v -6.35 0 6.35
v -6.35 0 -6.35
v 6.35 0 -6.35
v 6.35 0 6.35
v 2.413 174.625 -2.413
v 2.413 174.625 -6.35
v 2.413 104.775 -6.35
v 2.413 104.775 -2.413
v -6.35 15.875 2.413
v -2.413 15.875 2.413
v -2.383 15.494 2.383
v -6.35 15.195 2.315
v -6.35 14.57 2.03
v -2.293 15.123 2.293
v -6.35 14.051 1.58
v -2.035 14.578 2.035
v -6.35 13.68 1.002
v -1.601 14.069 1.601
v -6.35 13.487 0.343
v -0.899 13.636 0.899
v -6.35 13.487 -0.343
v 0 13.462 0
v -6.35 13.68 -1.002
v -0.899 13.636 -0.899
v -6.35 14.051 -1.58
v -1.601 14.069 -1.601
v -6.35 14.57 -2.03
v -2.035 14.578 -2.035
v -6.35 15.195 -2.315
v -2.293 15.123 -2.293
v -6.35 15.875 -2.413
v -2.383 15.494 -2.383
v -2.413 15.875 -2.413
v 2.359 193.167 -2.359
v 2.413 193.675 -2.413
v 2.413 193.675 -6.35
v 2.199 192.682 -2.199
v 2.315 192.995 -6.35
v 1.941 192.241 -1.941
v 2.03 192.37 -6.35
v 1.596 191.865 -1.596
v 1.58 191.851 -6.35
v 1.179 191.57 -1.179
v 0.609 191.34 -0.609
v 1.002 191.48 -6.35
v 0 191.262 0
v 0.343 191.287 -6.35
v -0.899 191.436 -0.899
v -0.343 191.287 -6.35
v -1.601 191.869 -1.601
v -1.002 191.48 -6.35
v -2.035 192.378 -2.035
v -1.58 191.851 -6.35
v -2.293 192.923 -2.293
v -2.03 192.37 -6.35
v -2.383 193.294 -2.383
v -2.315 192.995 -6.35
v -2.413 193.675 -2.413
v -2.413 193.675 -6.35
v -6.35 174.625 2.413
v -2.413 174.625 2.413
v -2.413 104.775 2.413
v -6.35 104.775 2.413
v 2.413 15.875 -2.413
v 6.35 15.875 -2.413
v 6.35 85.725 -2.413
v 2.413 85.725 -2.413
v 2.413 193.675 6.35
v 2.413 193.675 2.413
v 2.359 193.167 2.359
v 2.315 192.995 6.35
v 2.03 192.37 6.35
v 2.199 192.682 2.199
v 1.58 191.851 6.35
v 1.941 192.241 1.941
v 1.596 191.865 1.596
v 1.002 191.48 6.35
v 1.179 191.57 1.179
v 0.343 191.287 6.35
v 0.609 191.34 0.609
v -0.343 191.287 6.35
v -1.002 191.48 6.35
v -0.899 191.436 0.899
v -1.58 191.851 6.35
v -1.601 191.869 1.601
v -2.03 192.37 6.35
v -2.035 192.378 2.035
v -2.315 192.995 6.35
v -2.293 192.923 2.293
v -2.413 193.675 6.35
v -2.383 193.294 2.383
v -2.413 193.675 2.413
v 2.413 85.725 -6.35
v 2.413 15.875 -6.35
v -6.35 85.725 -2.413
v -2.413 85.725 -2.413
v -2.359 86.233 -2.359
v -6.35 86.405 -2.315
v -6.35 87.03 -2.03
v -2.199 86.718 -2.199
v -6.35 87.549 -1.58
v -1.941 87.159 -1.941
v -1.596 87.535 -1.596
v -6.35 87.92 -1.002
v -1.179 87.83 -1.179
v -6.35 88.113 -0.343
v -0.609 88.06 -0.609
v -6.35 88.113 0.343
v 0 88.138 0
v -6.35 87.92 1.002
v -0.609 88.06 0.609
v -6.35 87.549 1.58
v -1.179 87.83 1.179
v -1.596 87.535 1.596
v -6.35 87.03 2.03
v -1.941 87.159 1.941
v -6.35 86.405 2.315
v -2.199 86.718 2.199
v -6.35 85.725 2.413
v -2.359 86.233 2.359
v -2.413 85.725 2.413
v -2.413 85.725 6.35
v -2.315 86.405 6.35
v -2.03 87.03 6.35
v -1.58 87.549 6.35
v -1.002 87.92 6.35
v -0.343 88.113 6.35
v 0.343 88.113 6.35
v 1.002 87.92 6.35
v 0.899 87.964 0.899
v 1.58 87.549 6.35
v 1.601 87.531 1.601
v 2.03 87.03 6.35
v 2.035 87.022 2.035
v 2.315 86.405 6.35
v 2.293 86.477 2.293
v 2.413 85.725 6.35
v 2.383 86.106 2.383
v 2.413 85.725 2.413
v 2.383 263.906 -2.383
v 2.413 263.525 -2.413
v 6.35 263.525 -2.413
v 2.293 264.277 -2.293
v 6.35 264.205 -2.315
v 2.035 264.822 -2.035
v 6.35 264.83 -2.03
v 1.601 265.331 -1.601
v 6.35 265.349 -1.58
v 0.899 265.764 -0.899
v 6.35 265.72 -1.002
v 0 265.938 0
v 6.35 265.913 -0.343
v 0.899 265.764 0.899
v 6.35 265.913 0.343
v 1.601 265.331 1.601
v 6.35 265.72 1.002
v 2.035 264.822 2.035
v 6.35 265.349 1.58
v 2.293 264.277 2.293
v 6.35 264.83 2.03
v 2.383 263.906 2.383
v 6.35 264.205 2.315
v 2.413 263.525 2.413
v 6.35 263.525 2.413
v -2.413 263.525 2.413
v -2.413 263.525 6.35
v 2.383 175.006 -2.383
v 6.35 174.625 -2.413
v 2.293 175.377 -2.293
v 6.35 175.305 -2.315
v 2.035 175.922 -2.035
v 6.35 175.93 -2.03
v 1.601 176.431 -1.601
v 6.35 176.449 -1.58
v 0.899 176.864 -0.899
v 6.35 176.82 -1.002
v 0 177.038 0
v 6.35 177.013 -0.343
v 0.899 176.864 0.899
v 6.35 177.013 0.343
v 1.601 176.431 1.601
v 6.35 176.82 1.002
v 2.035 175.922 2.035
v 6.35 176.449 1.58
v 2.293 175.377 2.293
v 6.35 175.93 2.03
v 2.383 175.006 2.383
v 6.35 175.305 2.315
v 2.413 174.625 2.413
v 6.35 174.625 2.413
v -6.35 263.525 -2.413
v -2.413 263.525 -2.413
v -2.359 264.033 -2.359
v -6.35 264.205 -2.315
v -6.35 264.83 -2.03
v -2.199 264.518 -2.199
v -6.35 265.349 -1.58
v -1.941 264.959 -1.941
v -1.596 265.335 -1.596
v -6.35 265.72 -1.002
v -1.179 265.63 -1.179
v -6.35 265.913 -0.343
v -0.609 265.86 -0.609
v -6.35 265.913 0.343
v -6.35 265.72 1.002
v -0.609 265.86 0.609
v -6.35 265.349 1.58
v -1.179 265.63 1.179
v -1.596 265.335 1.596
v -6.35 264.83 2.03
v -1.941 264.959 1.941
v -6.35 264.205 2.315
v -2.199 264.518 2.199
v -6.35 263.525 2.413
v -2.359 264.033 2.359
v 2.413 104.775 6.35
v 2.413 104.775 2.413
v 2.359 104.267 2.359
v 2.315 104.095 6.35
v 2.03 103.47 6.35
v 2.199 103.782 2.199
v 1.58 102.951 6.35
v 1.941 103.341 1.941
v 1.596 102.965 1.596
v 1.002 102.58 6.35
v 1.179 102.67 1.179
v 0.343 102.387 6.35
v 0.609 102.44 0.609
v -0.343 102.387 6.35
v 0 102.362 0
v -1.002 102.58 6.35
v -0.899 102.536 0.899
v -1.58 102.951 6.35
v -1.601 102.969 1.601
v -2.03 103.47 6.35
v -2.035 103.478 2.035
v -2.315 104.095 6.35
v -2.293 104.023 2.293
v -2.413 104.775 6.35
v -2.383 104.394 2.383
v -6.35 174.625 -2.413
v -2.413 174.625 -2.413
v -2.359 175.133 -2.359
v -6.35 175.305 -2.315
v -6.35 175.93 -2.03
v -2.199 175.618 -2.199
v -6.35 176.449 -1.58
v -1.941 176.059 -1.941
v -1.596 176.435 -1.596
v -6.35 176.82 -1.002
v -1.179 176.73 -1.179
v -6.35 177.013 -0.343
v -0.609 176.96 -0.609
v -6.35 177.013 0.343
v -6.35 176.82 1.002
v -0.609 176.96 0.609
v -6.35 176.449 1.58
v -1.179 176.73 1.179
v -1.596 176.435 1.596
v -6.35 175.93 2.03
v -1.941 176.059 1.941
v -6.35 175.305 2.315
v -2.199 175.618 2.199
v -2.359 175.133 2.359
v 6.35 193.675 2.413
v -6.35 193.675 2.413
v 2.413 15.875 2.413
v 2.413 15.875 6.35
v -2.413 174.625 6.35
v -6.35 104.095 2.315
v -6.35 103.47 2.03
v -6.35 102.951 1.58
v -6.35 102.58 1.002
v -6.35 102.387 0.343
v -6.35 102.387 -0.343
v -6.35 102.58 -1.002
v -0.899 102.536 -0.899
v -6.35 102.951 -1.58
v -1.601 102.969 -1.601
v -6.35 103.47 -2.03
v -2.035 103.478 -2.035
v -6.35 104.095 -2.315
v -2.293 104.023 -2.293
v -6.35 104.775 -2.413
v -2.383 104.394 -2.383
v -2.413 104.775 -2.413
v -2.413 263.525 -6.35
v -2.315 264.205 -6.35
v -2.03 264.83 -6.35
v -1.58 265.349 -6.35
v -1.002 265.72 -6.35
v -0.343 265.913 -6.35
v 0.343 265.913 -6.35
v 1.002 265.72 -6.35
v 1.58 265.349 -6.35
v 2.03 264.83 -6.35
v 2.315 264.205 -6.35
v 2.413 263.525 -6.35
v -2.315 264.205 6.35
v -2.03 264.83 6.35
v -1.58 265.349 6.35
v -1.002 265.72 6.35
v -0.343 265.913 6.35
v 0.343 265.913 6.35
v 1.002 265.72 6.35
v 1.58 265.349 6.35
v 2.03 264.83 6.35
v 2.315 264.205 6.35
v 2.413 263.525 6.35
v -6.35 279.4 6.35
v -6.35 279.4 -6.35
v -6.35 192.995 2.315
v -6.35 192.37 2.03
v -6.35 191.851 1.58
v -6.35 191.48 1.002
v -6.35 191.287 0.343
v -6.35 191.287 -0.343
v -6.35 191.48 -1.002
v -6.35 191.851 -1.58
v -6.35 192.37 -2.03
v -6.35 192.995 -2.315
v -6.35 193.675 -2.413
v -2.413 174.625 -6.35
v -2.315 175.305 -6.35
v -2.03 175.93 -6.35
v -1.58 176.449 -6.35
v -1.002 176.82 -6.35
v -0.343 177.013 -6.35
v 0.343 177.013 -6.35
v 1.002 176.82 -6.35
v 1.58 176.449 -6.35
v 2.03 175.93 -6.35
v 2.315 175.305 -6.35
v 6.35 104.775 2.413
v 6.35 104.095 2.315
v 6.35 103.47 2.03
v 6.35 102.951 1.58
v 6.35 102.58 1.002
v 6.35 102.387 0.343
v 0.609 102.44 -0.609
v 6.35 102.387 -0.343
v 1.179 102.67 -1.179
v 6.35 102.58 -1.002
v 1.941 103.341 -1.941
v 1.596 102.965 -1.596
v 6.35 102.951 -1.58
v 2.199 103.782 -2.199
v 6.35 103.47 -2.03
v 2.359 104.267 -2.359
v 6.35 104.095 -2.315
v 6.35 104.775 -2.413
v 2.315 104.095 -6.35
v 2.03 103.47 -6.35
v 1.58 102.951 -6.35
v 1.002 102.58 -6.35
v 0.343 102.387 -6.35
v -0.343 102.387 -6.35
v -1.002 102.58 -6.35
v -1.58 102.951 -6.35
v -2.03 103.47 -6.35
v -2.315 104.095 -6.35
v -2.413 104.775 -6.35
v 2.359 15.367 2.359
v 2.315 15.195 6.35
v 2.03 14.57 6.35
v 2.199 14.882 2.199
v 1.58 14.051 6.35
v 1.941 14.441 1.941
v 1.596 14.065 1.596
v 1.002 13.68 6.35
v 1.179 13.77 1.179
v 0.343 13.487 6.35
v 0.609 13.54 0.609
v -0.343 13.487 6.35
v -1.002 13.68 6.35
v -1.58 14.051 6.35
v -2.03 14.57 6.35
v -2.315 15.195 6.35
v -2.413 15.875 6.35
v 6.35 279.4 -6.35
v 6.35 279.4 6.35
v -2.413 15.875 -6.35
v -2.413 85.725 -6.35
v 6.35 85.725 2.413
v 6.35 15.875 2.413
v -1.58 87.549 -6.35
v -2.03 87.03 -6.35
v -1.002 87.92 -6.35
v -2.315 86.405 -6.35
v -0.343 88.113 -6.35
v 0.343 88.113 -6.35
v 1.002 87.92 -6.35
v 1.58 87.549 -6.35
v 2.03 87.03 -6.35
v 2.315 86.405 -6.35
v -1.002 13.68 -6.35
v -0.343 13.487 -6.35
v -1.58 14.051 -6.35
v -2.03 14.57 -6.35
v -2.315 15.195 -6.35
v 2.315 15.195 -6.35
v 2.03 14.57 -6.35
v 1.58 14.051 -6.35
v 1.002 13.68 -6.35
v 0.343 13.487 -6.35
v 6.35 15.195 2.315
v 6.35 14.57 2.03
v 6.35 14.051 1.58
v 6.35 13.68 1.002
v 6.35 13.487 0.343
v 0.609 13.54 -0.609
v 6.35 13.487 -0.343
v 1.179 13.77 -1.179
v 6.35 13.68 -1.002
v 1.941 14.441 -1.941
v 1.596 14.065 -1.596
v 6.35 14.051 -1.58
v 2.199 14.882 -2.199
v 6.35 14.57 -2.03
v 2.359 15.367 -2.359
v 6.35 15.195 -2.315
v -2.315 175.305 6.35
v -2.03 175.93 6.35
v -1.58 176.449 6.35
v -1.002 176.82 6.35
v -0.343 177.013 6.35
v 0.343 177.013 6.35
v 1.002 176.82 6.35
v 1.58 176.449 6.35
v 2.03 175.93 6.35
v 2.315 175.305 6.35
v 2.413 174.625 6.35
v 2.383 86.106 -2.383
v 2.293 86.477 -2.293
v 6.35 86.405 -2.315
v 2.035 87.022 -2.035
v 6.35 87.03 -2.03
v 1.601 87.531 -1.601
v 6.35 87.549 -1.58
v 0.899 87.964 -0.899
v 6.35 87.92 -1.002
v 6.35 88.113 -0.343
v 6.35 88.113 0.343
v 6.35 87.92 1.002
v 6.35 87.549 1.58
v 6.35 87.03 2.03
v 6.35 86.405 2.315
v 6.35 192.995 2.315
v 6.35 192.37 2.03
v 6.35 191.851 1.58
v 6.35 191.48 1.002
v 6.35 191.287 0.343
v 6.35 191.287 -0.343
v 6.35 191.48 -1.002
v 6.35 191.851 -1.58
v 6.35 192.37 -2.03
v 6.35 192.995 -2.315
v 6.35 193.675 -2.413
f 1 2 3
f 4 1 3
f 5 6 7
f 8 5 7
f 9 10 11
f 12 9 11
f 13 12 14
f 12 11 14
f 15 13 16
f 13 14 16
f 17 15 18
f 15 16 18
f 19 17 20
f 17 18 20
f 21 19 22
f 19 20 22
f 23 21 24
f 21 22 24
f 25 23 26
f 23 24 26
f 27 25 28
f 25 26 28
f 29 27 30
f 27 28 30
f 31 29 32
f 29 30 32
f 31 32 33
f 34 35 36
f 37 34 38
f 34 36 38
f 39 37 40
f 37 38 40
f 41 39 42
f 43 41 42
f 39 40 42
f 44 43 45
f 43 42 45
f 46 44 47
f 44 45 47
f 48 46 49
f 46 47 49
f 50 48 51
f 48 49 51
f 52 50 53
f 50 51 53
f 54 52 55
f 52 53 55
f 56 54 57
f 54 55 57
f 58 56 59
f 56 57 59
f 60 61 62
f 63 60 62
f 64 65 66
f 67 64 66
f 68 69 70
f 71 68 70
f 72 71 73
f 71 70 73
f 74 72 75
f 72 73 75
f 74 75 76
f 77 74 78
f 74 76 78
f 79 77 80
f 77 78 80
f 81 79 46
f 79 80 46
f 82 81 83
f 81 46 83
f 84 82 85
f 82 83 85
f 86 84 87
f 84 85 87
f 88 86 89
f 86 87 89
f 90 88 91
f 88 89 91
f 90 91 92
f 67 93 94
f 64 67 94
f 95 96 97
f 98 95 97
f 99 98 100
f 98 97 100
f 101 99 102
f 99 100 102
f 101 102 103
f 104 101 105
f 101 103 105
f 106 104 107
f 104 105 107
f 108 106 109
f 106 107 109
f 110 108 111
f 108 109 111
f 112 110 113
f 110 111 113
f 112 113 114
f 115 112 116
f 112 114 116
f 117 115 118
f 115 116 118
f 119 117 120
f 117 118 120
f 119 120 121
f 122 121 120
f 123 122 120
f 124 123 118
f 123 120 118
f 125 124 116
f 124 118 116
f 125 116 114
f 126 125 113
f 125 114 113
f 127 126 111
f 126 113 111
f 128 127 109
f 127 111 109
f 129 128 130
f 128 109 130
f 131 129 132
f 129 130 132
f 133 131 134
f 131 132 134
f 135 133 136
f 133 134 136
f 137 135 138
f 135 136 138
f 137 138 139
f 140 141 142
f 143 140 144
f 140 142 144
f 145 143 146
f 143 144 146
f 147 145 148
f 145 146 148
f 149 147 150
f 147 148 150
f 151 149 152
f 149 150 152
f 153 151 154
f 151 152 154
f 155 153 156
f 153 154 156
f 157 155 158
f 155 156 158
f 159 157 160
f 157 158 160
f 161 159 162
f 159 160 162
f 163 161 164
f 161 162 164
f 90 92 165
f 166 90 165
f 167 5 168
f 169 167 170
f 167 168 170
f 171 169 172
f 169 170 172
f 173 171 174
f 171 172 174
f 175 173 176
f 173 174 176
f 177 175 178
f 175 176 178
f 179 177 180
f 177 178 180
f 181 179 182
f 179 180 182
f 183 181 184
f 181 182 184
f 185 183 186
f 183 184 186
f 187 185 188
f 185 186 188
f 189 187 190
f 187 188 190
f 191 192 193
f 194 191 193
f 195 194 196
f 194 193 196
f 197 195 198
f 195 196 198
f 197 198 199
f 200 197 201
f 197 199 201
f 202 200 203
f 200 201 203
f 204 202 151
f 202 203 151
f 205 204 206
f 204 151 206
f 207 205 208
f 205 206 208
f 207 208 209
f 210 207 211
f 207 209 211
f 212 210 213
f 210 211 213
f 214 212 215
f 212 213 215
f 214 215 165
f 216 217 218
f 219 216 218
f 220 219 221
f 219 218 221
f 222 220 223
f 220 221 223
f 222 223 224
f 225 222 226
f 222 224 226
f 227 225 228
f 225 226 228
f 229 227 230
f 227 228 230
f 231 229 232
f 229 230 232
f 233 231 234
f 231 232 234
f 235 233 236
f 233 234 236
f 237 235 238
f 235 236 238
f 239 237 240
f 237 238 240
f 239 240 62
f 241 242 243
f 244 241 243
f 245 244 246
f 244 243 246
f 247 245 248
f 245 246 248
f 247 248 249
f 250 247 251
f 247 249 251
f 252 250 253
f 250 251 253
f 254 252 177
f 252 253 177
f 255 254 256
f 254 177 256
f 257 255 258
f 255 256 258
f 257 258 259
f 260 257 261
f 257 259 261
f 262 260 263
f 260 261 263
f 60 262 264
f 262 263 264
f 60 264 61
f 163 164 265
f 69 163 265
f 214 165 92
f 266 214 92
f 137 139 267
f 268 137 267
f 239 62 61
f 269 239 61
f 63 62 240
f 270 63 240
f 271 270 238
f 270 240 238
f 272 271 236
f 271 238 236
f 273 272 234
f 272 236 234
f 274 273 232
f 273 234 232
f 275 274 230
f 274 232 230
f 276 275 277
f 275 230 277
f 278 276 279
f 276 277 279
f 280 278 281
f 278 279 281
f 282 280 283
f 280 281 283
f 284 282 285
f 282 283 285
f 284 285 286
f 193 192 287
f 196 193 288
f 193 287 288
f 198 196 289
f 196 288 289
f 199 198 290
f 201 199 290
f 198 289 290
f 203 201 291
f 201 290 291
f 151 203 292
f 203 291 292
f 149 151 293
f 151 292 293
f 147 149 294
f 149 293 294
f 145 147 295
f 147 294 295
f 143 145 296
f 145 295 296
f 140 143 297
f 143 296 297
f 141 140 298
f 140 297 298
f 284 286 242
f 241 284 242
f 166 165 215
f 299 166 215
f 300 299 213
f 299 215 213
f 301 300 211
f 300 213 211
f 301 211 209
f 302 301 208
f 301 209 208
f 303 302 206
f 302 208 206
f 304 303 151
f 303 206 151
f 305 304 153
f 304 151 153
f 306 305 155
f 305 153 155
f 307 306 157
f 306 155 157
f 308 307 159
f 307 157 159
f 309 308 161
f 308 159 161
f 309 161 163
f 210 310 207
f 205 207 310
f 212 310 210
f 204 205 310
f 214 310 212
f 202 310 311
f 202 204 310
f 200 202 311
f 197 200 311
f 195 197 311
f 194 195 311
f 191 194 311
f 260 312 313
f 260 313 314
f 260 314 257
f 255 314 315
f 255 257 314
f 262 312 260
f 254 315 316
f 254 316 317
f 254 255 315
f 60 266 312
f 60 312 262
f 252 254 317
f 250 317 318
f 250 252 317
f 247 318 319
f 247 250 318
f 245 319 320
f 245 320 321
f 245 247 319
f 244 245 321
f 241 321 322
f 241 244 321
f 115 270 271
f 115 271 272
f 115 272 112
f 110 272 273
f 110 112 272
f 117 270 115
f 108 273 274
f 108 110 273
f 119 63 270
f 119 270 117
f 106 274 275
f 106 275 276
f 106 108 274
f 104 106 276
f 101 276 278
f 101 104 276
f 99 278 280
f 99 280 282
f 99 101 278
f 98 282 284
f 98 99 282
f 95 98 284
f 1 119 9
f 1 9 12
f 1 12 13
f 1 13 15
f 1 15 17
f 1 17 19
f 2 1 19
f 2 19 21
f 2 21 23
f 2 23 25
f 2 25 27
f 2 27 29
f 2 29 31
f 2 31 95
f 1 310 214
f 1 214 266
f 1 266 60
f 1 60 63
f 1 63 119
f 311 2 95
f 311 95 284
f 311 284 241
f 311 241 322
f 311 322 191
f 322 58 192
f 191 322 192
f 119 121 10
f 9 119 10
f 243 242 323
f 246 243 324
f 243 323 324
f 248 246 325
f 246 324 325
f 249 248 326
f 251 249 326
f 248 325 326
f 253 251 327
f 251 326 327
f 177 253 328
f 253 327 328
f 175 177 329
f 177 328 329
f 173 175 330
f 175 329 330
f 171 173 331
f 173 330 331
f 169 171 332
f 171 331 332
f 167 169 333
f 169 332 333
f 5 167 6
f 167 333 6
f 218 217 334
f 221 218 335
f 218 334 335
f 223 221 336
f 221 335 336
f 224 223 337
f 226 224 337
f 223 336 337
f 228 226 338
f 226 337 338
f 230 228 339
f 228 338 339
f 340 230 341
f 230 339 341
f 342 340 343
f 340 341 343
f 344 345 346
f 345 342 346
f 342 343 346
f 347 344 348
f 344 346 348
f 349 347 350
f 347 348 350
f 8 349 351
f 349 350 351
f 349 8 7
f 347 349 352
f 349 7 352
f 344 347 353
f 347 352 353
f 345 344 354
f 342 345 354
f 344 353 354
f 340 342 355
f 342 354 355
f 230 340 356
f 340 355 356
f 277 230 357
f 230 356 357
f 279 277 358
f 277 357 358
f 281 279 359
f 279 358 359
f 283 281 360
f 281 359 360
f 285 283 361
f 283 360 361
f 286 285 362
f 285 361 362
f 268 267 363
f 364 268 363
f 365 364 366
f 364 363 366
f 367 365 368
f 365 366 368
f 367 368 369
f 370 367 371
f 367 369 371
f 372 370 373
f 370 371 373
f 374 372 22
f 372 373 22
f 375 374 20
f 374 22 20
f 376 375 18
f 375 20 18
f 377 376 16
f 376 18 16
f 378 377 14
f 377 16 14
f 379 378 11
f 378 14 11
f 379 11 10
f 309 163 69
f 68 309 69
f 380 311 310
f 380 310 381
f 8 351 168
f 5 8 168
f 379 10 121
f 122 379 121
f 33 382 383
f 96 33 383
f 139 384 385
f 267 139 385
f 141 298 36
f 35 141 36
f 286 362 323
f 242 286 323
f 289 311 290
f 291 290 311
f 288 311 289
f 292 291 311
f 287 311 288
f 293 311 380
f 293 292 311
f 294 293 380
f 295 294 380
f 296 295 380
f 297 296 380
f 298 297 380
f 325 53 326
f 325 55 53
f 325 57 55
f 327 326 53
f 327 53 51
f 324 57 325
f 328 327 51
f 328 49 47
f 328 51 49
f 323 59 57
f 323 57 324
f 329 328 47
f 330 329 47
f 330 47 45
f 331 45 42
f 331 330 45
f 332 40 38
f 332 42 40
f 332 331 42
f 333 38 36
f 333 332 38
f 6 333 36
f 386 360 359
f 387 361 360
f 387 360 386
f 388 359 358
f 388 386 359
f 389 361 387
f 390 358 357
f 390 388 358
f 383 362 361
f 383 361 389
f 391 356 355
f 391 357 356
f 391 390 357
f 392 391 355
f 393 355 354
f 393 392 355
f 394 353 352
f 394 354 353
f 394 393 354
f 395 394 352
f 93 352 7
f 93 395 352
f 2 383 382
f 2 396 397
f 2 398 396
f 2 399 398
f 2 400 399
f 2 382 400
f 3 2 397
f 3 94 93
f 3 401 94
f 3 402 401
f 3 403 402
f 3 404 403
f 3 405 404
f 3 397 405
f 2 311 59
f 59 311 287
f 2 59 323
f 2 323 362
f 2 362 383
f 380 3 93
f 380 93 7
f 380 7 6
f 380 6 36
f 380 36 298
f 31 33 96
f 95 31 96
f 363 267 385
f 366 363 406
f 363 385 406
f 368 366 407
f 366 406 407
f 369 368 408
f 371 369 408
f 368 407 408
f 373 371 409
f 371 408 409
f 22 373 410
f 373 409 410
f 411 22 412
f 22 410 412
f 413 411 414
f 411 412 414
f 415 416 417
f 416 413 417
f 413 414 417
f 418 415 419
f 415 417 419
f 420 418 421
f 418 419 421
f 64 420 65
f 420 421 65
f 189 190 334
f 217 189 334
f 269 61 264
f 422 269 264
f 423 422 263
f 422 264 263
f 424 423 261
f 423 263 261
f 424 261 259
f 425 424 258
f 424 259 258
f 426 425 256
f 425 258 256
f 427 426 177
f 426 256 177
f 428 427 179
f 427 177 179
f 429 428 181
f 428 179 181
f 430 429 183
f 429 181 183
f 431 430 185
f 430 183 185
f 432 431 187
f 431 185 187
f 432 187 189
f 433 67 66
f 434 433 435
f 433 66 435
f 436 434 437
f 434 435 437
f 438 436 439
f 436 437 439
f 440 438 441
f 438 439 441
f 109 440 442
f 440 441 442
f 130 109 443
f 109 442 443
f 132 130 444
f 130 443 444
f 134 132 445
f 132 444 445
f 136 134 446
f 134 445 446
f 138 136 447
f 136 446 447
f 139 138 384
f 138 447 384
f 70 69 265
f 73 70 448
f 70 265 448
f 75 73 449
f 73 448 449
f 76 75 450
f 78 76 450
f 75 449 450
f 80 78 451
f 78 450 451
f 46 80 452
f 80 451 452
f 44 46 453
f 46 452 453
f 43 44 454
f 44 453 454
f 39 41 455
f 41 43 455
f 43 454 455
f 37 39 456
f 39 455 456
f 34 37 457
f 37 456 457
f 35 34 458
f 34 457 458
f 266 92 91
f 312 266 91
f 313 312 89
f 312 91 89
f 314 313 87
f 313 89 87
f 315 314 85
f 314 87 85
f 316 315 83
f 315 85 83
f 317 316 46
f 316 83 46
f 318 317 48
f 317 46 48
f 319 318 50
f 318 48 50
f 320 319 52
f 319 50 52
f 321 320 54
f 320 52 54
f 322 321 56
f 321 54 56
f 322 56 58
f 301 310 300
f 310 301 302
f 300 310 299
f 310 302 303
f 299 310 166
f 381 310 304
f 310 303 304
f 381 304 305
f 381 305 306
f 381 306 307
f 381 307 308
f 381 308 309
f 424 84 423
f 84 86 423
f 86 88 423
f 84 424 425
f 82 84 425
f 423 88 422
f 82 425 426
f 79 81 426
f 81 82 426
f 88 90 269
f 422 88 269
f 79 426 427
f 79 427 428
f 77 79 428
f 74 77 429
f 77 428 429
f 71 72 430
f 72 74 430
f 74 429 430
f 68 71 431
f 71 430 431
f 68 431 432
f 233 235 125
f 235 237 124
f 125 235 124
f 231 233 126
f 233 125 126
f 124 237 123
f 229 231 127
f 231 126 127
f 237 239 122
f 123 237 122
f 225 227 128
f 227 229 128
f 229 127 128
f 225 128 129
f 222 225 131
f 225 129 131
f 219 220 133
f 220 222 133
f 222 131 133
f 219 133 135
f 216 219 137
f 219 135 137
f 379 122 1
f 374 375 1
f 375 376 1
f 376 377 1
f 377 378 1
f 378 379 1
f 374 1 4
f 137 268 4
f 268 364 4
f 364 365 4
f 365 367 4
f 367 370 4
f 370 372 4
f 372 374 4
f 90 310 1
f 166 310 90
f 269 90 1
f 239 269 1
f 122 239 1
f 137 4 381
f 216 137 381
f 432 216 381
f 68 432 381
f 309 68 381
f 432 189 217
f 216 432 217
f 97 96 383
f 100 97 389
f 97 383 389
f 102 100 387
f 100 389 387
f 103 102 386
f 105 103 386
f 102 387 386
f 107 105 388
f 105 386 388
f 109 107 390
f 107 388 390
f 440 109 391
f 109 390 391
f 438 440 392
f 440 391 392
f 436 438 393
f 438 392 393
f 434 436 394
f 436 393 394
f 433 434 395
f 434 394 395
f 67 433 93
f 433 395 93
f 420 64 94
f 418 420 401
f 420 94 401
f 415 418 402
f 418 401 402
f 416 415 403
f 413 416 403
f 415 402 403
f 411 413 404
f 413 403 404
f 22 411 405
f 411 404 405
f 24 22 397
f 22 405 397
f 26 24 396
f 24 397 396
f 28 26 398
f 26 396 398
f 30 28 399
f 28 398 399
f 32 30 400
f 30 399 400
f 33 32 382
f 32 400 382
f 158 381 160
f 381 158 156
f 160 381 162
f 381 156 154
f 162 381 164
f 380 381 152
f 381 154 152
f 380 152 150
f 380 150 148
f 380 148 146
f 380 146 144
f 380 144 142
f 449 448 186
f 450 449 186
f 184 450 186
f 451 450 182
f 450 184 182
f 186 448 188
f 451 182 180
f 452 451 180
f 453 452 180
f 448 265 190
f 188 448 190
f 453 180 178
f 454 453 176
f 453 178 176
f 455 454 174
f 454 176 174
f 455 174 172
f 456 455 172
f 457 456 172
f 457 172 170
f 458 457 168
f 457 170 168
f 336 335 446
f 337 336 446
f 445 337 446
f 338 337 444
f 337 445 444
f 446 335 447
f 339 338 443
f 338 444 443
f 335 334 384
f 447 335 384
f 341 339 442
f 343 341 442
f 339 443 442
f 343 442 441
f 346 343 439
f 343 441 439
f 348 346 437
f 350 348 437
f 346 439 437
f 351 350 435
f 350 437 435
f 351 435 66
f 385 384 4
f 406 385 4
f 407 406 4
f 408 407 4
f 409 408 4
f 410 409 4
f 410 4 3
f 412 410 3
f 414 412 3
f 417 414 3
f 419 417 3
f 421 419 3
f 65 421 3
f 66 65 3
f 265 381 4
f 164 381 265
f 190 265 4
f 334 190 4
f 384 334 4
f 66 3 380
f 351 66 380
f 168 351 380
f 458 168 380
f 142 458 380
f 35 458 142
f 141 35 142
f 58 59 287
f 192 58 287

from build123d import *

# Parameters (mm, degrees)
SKETCH1_W           = 12.7
SKETCH1_H           = 12.7
BOSS_EXTRUDE1_DEPTH = 279.4
CUT_EXTRUDE1_DEPTH  = 13.7
CUT_EXTRUDE2_DEPTH  = 13.7
LPATTERN1_COUNT     = 3
LPATTERN1_PITCH     = 88.9


with BuildPart() as part:
    # Sketch1 → Boss-Extrude1 (new body)
    with BuildSketch(Plane(origin=(0, 0, 0), x_dir=(1, 0, 0), z_dir=(0, 1, 0))):
        Rectangle(SKETCH1_W, SKETCH1_H)
    extrude(amount=BOSS_EXTRUDE1_DEPTH)

    # Sketch2 → Cut-Extrude1 (cut, through all)
    with BuildSketch(Plane(origin=(0, 0, -6.35), x_dir=(-1, 0, 0), z_dir=(0, 0, -1))):
        with BuildLine():
            Line((-2.413, 263.525), (-2.413, 193.675))
            ThreePointArc((-2.413, 193.675), (0, 191.262), (2.413, 193.675))
            Line((2.413, 193.675), (2.413, 263.525))
            ThreePointArc((2.413, 263.525), (0, 265.938), (-2.413, 263.525))
        make_face()
    cut_extrude1 = extrude(amount=-CUT_EXTRUDE1_DEPTH, mode=Mode.SUBTRACT)

    # Sketch3 → Cut-Extrude2 (cut, through all)
    with BuildSketch(Plane(origin=(6.35, 0, 0), x_dir=(0, 0, -1), z_dir=(1, 0, 0))):
        with BuildLine():
            Line((-2.413, 263.525), (-2.413, 193.675))
            ThreePointArc((-2.413, 193.675), (0, 191.262), (2.413, 193.675))
            Line((2.413, 193.675), (2.413, 263.525))
            ThreePointArc((2.413, 263.525), (0, 265.938), (-2.413, 263.525))
        make_face()
    cut_extrude2 = extrude(amount=-CUT_EXTRUDE2_DEPTH, mode=Mode.SUBTRACT)

    # LPattern1: Cut-Extrude1, Cut-Extrude2 ×3
    with Locations(*[(0, -i * LPATTERN1_PITCH, 0) for i in range(1, LPATTERN1_COUNT)]):
        add(cut_extrude1, mode=Mode.SUBTRACT)
        add(cut_extrude2, mode=Mode.SUBTRACT)


solid = part.part
